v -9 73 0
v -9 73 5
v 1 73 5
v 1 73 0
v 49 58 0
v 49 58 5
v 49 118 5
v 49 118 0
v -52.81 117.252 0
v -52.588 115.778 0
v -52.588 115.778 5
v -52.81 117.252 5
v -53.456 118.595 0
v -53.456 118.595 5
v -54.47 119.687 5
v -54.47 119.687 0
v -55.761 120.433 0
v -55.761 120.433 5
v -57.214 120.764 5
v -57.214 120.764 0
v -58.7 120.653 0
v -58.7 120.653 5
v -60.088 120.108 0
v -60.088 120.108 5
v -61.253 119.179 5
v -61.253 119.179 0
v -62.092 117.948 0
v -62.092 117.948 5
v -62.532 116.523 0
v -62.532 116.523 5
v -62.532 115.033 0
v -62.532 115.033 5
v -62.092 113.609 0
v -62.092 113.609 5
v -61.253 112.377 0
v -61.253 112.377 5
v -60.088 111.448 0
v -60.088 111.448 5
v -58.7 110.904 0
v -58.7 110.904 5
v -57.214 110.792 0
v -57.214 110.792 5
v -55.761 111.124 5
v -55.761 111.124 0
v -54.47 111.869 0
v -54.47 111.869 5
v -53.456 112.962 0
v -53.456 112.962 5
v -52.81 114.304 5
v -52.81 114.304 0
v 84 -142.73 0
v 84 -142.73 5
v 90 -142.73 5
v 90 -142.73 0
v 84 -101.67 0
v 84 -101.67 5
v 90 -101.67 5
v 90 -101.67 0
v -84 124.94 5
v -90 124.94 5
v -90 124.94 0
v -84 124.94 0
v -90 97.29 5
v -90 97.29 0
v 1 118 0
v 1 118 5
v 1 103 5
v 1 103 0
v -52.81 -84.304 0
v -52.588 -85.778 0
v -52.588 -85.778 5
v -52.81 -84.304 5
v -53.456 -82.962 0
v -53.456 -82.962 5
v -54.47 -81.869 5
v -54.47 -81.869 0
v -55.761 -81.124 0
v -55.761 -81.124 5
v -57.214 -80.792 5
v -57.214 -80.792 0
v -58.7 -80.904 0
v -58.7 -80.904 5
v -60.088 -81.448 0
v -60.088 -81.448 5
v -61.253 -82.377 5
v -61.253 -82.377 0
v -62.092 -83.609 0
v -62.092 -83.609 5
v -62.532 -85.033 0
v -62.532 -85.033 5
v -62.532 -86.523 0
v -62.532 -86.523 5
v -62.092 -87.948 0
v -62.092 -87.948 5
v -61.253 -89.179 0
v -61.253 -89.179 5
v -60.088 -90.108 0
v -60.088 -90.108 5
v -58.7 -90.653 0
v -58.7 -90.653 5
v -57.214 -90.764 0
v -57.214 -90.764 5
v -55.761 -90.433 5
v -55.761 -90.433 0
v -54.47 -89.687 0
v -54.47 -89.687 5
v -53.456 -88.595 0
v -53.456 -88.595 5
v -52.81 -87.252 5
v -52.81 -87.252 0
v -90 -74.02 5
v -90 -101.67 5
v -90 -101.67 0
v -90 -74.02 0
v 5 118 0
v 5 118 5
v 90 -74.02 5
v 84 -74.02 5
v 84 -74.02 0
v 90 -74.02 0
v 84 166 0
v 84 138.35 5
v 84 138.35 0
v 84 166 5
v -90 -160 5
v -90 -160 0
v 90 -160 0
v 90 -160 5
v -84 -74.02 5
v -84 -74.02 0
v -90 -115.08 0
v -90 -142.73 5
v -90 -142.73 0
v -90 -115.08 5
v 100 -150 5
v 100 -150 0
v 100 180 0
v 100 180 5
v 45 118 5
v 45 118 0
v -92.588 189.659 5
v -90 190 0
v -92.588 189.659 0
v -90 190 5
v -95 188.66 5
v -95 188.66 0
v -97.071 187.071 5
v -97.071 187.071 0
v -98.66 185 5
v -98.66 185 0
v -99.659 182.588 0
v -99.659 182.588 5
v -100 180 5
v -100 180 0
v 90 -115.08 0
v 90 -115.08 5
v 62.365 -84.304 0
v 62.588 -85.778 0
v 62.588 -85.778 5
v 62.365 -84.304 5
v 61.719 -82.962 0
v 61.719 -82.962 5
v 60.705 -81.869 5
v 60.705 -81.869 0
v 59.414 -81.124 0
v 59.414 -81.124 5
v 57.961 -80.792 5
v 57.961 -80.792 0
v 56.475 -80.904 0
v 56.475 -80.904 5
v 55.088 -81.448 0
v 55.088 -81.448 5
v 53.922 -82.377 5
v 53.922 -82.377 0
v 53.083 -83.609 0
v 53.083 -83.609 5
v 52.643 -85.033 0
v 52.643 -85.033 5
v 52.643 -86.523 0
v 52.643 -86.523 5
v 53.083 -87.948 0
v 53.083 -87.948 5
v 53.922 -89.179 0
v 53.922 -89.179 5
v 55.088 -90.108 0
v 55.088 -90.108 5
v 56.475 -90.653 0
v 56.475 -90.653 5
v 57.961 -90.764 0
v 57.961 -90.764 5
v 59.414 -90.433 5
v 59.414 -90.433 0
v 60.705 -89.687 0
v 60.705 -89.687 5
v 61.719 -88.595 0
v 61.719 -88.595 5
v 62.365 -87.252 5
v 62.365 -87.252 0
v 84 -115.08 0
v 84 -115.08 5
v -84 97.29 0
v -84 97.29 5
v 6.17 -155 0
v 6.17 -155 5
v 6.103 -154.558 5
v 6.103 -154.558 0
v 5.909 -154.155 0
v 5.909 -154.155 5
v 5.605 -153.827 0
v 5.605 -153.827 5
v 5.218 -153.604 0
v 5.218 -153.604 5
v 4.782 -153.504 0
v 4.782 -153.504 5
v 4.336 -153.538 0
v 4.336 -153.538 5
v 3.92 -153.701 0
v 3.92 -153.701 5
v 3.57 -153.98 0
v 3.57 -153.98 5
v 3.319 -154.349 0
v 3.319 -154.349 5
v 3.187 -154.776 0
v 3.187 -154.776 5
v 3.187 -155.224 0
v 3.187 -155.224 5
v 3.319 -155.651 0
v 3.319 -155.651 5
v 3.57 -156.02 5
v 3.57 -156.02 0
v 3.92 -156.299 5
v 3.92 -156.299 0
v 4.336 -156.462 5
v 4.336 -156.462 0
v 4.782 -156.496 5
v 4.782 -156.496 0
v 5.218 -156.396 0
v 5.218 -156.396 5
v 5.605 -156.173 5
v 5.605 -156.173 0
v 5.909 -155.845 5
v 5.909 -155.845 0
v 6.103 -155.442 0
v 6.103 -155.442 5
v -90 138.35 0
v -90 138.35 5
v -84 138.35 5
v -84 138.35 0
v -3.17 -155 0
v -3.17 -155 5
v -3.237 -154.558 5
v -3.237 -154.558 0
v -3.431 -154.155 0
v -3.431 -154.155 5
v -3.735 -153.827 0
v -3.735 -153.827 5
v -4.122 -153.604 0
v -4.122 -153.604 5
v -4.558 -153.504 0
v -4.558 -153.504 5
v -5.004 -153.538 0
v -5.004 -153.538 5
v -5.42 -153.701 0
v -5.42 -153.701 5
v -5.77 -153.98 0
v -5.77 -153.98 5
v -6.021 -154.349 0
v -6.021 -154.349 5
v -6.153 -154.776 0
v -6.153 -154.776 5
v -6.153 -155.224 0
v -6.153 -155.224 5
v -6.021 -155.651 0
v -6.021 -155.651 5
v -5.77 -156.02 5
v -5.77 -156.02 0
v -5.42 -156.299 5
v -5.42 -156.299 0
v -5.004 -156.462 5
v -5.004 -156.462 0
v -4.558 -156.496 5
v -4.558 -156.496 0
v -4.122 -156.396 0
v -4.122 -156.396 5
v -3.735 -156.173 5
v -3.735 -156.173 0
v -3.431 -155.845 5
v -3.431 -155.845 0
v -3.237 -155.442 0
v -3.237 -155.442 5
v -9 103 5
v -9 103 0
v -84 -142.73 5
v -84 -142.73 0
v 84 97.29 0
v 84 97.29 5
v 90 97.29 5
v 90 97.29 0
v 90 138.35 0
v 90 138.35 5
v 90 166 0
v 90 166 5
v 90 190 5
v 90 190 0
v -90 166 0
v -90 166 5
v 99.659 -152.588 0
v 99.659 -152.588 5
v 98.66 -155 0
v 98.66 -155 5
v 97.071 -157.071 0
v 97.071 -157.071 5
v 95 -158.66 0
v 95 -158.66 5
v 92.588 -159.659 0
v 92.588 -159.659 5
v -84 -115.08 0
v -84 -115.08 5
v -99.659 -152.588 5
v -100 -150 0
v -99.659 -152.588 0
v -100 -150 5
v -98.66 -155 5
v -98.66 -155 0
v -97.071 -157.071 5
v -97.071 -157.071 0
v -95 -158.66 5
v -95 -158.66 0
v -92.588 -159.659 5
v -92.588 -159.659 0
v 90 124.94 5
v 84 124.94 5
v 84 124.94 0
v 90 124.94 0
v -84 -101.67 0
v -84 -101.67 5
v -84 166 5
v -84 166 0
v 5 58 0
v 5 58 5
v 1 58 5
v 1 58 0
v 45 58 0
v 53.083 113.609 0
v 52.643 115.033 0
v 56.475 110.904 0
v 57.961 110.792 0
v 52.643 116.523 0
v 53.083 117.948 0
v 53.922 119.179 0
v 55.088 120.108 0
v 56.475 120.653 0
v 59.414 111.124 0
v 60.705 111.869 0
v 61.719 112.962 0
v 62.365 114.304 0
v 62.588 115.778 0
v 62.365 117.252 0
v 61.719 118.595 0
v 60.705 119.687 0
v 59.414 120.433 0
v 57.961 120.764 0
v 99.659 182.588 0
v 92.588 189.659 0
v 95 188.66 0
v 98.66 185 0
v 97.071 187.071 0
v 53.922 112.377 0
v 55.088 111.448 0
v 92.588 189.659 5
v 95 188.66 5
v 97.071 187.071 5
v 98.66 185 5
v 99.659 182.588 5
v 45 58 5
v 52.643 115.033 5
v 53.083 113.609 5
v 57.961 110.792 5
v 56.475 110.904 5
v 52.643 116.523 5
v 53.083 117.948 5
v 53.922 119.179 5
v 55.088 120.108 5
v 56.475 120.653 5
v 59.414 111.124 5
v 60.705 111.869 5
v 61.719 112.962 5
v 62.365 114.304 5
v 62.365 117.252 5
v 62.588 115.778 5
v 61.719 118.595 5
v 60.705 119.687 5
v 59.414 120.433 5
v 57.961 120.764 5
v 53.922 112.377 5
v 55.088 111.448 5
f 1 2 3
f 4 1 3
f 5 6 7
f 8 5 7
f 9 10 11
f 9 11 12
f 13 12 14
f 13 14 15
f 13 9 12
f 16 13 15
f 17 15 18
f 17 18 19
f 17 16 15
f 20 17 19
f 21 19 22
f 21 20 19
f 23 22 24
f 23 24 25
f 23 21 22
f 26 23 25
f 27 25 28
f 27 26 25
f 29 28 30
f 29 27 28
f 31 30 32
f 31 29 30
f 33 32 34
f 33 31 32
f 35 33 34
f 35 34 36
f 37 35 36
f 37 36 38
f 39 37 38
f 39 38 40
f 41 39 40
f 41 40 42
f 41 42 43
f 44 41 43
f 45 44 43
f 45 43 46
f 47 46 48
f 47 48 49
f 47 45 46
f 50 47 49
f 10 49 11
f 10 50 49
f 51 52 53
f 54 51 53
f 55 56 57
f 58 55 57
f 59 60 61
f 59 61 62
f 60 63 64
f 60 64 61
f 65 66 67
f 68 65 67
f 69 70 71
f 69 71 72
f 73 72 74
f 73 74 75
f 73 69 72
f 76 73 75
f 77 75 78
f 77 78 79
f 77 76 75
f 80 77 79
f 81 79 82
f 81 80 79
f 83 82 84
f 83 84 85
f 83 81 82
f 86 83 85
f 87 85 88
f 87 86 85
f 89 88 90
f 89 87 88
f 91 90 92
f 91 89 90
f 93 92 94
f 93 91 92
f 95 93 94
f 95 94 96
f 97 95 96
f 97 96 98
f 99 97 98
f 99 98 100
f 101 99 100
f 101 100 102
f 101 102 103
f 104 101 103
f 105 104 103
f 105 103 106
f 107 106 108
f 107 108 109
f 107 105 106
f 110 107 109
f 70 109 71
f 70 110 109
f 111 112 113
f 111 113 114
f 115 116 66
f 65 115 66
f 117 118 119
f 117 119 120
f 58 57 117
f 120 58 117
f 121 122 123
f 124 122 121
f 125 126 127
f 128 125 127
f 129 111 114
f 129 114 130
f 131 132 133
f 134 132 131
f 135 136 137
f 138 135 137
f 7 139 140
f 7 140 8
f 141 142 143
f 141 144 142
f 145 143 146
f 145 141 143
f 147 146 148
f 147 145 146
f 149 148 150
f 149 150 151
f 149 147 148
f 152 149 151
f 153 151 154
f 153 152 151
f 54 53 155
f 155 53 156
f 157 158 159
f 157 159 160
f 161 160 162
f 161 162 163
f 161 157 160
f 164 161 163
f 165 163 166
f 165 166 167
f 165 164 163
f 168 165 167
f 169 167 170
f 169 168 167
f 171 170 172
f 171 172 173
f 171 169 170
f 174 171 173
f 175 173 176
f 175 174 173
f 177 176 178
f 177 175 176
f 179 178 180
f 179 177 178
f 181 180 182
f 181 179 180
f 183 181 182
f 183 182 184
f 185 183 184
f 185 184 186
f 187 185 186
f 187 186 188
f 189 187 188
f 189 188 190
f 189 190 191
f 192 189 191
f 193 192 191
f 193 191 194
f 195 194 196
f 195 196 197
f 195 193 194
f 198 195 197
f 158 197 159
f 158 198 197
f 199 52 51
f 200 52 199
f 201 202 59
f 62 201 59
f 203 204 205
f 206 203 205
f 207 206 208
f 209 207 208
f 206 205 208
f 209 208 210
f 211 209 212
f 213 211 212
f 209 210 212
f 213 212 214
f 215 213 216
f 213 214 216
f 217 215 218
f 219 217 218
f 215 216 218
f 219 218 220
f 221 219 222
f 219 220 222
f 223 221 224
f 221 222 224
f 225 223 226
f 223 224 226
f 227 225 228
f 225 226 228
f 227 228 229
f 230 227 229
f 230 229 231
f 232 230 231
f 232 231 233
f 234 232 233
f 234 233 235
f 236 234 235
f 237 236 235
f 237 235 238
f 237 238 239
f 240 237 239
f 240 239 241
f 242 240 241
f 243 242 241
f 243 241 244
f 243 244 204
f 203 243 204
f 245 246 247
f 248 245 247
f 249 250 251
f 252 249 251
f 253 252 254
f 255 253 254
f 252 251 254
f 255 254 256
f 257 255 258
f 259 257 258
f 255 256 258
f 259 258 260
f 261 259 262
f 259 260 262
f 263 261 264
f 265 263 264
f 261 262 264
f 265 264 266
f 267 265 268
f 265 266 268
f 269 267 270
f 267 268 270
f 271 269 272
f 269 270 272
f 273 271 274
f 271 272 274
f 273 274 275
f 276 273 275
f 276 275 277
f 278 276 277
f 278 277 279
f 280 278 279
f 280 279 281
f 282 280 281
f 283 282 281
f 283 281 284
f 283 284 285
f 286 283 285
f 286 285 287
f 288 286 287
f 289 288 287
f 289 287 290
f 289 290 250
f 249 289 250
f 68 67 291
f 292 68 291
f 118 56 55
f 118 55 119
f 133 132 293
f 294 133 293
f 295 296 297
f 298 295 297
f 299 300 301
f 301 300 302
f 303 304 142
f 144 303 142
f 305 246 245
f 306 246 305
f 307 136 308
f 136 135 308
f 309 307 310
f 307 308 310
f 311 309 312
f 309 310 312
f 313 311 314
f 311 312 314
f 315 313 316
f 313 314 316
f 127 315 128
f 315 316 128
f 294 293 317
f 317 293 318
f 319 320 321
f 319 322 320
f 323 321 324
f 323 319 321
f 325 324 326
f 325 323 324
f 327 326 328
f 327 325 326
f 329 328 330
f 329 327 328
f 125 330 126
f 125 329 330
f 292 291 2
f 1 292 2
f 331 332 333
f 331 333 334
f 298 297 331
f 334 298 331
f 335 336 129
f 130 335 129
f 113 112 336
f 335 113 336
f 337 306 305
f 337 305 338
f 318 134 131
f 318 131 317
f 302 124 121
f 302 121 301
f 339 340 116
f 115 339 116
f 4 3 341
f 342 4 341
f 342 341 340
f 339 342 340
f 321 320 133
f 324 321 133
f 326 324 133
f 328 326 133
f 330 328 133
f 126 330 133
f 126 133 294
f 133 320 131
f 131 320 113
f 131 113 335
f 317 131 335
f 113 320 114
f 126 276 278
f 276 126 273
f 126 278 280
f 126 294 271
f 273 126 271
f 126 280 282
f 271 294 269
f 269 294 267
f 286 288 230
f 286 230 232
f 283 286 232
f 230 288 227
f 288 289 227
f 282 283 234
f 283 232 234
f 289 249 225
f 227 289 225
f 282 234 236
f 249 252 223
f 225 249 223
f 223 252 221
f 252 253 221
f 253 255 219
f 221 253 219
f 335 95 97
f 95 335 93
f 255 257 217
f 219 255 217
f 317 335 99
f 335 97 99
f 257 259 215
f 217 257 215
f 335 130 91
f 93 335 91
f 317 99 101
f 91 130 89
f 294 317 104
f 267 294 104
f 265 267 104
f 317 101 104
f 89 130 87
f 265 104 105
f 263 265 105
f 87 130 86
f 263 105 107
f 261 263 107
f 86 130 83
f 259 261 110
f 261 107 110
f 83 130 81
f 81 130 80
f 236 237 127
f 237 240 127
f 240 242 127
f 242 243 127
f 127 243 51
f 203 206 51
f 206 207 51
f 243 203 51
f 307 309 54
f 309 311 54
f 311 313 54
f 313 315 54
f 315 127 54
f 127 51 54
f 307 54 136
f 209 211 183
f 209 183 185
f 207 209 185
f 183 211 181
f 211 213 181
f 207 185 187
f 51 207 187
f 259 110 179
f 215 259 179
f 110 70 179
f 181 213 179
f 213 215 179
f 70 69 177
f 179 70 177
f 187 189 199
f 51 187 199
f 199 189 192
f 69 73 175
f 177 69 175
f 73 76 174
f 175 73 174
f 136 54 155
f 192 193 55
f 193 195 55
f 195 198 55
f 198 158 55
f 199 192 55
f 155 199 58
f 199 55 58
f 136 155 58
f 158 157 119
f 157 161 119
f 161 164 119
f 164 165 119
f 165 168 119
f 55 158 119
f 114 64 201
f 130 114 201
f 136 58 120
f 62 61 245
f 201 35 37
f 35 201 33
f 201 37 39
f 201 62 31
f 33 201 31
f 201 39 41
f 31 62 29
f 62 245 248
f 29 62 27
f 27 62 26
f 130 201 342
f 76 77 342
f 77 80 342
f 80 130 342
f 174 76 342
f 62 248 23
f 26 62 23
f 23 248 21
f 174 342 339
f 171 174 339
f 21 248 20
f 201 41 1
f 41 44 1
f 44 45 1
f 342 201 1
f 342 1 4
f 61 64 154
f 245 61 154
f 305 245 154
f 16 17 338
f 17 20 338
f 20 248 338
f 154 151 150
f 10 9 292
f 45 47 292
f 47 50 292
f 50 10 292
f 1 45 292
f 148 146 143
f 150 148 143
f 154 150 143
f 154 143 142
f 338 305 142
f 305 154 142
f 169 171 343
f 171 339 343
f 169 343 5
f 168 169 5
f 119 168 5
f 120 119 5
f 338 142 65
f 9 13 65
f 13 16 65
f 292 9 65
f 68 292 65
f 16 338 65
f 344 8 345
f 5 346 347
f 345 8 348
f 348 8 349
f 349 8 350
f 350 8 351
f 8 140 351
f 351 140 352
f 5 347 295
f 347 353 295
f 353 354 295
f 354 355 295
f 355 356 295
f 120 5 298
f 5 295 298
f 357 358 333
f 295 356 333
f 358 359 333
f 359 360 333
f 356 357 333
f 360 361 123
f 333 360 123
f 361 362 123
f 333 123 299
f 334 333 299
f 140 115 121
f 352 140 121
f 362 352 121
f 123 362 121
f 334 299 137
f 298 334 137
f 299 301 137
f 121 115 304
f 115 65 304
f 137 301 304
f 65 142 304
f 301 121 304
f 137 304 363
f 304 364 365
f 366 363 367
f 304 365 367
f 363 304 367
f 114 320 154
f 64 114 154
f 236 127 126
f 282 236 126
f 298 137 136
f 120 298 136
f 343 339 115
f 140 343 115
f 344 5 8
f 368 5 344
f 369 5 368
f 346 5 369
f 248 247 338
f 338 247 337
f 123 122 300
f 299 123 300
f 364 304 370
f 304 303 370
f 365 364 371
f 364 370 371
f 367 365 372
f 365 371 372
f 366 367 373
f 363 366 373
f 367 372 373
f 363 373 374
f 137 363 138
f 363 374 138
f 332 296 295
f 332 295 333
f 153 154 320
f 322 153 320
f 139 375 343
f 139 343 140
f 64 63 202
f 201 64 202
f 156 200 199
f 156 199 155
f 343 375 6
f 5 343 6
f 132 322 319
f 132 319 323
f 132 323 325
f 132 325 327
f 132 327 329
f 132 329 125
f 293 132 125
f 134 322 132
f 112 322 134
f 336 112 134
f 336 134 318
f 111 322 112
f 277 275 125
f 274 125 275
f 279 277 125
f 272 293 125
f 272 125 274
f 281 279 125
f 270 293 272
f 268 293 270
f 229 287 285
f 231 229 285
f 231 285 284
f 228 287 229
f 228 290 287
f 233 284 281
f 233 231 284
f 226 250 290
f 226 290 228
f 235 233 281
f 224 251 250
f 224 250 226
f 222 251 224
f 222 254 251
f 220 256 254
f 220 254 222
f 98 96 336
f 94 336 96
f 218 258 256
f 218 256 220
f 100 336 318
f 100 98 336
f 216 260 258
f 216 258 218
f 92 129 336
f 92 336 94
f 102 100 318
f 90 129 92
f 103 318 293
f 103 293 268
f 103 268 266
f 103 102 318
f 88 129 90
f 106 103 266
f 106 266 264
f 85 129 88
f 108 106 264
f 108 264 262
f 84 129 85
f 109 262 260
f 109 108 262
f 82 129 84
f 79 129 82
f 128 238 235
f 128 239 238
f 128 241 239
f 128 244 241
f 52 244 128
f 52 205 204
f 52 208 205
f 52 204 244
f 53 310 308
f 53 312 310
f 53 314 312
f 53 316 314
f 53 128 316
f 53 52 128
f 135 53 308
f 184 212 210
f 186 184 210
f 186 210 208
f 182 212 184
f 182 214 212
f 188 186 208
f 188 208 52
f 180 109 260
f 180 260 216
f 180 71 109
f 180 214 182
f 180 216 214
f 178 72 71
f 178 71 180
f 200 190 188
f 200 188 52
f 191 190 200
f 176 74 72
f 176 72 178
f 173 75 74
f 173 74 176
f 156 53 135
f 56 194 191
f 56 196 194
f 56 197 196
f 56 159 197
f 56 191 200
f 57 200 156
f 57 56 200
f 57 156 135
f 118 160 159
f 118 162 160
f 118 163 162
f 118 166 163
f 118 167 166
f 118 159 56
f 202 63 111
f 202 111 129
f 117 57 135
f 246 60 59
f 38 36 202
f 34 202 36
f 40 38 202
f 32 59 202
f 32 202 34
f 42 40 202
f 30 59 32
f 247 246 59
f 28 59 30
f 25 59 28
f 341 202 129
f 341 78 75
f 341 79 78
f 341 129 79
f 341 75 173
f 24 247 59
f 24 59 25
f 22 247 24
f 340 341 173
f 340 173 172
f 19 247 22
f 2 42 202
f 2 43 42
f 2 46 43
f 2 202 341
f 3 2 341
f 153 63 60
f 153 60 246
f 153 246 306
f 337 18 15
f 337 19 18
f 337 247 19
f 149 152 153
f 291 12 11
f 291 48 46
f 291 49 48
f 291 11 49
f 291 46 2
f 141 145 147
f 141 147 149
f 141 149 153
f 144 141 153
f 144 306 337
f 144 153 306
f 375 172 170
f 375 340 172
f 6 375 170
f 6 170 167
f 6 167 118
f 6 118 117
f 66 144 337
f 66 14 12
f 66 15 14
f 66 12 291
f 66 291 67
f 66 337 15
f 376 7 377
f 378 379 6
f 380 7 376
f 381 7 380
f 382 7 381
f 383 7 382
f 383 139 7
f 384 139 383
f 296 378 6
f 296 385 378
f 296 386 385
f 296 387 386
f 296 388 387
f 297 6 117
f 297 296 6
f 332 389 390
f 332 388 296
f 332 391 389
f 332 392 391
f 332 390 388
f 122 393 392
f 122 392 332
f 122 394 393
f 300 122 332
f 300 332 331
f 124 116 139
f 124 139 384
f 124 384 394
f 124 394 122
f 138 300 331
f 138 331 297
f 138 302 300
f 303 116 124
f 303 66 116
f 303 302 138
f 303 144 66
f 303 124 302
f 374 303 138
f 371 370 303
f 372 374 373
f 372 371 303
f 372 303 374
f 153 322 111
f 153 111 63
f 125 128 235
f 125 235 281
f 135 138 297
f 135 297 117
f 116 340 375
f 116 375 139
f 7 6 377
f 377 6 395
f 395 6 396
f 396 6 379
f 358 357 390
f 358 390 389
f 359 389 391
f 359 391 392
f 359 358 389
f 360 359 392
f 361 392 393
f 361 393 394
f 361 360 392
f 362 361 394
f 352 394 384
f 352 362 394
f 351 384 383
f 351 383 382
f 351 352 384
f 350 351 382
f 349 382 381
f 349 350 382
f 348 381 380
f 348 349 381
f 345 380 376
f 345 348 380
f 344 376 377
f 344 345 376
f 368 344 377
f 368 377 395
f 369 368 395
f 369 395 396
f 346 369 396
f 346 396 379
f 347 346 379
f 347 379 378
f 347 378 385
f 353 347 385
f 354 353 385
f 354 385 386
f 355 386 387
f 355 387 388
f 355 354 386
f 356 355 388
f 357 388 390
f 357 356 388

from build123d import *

# Parameters (mm, degrees)
SKETCH1_R           = 5
BOSS_EXTRUDE1_DEPTH = 5
SKETCH4_W           = 4
SKETCH4_H           = 60
CUT_EXTRUDE1_DEPTH  = 10
SKETCH5_R           = 1.5
SKETCH5_W           = 6
SKETCH5_H           = 27.65
CUT_EXTRUDE2_DEPTH  = 6
FILLET1_R           = 10


with BuildPart() as part:
    # Sketch1 → Boss-Extrude1 (new body)
    with BuildSketch(Plane.XY):
        Polygon((100, 190), (-100, 190), (-100, -90), (-100, -160), (100, -160), (100, -90), align=None)
        with Locations((-57.587555345, 115.778221854)):
            Circle(SKETCH1_R, mode=Mode.SUBTRACT)
        with Locations((57.587555345, 115.778221854)):
            Circle(SKETCH1_R, mode=Mode.SUBTRACT)
        with Locations((57.587555345, -85.778221854)):
            Circle(SKETCH1_R, mode=Mode.SUBTRACT)
        with Locations((-57.587555345, -85.778221854)):
            Circle(SKETCH1_R, mode=Mode.SUBTRACT)
    extrude(amount=BOSS_EXTRUDE1_DEPTH)

    # Sketch4 → Cut-Extrude1 (cut)
    with BuildSketch(Plane.XY.offset(5)):
        Polygon((1, 73), (1, 58), (5, 58), (5, 118), (1, 118), (1, 103), (-9, 103), (-9, 73), align=None)
        with Locations((47, 88)):
            Rectangle(SKETCH4_W, SKETCH4_H)
    extrude(amount=-CUT_EXTRUDE1_DEPTH, mode=Mode.SUBTRACT)

    # Sketch5 → Cut-Extrude2 (cut, through all)
    with BuildSketch(Plane.XY.offset(5)):
        with Locations((4.67, -155)):
            Circle(SKETCH5_R)
        with Locations((-4.67, -155)):
            Circle(SKETCH5_R)
        with Locations((-87, 152.175)):
            Rectangle(SKETCH5_W, SKETCH5_H)
        with Locations((-87, 111.115)):
            Rectangle(SKETCH5_W, SKETCH5_H)
        with Locations((-87, -87.845)):
            Rectangle(SKETCH5_W, SKETCH5_H)
        with Locations((-87, -128.905)):
            Rectangle(SKETCH5_W, SKETCH5_H)
        with Locations((87, -87.845)):
            Rectangle(SKETCH5_W, SKETCH5_H)
        with Locations((87, -128.905)):
            Rectangle(SKETCH5_W, SKETCH5_H)
        with Locations((87, 152.175)):
            Rectangle(SKETCH5_W, SKETCH5_H)
        with Locations((87, 111.115)):
            Rectangle(SKETCH5_W, SKETCH5_H)
    extrude(amount=-CUT_EXTRUDE2_DEPTH, mode=Mode.SUBTRACT)

    # Fillet1
    fillet1_edges = [part.edges().sort_by_distance(p)[0] for p in [
        (-100, 190, 2.5),
        (100, 190, 2.5),
        (100, -160, 2.5),
        (-100, -160, 2.5),
    ]]
    fillet(fillet1_edges, radius=FILLET1_R)


solid = part.part
